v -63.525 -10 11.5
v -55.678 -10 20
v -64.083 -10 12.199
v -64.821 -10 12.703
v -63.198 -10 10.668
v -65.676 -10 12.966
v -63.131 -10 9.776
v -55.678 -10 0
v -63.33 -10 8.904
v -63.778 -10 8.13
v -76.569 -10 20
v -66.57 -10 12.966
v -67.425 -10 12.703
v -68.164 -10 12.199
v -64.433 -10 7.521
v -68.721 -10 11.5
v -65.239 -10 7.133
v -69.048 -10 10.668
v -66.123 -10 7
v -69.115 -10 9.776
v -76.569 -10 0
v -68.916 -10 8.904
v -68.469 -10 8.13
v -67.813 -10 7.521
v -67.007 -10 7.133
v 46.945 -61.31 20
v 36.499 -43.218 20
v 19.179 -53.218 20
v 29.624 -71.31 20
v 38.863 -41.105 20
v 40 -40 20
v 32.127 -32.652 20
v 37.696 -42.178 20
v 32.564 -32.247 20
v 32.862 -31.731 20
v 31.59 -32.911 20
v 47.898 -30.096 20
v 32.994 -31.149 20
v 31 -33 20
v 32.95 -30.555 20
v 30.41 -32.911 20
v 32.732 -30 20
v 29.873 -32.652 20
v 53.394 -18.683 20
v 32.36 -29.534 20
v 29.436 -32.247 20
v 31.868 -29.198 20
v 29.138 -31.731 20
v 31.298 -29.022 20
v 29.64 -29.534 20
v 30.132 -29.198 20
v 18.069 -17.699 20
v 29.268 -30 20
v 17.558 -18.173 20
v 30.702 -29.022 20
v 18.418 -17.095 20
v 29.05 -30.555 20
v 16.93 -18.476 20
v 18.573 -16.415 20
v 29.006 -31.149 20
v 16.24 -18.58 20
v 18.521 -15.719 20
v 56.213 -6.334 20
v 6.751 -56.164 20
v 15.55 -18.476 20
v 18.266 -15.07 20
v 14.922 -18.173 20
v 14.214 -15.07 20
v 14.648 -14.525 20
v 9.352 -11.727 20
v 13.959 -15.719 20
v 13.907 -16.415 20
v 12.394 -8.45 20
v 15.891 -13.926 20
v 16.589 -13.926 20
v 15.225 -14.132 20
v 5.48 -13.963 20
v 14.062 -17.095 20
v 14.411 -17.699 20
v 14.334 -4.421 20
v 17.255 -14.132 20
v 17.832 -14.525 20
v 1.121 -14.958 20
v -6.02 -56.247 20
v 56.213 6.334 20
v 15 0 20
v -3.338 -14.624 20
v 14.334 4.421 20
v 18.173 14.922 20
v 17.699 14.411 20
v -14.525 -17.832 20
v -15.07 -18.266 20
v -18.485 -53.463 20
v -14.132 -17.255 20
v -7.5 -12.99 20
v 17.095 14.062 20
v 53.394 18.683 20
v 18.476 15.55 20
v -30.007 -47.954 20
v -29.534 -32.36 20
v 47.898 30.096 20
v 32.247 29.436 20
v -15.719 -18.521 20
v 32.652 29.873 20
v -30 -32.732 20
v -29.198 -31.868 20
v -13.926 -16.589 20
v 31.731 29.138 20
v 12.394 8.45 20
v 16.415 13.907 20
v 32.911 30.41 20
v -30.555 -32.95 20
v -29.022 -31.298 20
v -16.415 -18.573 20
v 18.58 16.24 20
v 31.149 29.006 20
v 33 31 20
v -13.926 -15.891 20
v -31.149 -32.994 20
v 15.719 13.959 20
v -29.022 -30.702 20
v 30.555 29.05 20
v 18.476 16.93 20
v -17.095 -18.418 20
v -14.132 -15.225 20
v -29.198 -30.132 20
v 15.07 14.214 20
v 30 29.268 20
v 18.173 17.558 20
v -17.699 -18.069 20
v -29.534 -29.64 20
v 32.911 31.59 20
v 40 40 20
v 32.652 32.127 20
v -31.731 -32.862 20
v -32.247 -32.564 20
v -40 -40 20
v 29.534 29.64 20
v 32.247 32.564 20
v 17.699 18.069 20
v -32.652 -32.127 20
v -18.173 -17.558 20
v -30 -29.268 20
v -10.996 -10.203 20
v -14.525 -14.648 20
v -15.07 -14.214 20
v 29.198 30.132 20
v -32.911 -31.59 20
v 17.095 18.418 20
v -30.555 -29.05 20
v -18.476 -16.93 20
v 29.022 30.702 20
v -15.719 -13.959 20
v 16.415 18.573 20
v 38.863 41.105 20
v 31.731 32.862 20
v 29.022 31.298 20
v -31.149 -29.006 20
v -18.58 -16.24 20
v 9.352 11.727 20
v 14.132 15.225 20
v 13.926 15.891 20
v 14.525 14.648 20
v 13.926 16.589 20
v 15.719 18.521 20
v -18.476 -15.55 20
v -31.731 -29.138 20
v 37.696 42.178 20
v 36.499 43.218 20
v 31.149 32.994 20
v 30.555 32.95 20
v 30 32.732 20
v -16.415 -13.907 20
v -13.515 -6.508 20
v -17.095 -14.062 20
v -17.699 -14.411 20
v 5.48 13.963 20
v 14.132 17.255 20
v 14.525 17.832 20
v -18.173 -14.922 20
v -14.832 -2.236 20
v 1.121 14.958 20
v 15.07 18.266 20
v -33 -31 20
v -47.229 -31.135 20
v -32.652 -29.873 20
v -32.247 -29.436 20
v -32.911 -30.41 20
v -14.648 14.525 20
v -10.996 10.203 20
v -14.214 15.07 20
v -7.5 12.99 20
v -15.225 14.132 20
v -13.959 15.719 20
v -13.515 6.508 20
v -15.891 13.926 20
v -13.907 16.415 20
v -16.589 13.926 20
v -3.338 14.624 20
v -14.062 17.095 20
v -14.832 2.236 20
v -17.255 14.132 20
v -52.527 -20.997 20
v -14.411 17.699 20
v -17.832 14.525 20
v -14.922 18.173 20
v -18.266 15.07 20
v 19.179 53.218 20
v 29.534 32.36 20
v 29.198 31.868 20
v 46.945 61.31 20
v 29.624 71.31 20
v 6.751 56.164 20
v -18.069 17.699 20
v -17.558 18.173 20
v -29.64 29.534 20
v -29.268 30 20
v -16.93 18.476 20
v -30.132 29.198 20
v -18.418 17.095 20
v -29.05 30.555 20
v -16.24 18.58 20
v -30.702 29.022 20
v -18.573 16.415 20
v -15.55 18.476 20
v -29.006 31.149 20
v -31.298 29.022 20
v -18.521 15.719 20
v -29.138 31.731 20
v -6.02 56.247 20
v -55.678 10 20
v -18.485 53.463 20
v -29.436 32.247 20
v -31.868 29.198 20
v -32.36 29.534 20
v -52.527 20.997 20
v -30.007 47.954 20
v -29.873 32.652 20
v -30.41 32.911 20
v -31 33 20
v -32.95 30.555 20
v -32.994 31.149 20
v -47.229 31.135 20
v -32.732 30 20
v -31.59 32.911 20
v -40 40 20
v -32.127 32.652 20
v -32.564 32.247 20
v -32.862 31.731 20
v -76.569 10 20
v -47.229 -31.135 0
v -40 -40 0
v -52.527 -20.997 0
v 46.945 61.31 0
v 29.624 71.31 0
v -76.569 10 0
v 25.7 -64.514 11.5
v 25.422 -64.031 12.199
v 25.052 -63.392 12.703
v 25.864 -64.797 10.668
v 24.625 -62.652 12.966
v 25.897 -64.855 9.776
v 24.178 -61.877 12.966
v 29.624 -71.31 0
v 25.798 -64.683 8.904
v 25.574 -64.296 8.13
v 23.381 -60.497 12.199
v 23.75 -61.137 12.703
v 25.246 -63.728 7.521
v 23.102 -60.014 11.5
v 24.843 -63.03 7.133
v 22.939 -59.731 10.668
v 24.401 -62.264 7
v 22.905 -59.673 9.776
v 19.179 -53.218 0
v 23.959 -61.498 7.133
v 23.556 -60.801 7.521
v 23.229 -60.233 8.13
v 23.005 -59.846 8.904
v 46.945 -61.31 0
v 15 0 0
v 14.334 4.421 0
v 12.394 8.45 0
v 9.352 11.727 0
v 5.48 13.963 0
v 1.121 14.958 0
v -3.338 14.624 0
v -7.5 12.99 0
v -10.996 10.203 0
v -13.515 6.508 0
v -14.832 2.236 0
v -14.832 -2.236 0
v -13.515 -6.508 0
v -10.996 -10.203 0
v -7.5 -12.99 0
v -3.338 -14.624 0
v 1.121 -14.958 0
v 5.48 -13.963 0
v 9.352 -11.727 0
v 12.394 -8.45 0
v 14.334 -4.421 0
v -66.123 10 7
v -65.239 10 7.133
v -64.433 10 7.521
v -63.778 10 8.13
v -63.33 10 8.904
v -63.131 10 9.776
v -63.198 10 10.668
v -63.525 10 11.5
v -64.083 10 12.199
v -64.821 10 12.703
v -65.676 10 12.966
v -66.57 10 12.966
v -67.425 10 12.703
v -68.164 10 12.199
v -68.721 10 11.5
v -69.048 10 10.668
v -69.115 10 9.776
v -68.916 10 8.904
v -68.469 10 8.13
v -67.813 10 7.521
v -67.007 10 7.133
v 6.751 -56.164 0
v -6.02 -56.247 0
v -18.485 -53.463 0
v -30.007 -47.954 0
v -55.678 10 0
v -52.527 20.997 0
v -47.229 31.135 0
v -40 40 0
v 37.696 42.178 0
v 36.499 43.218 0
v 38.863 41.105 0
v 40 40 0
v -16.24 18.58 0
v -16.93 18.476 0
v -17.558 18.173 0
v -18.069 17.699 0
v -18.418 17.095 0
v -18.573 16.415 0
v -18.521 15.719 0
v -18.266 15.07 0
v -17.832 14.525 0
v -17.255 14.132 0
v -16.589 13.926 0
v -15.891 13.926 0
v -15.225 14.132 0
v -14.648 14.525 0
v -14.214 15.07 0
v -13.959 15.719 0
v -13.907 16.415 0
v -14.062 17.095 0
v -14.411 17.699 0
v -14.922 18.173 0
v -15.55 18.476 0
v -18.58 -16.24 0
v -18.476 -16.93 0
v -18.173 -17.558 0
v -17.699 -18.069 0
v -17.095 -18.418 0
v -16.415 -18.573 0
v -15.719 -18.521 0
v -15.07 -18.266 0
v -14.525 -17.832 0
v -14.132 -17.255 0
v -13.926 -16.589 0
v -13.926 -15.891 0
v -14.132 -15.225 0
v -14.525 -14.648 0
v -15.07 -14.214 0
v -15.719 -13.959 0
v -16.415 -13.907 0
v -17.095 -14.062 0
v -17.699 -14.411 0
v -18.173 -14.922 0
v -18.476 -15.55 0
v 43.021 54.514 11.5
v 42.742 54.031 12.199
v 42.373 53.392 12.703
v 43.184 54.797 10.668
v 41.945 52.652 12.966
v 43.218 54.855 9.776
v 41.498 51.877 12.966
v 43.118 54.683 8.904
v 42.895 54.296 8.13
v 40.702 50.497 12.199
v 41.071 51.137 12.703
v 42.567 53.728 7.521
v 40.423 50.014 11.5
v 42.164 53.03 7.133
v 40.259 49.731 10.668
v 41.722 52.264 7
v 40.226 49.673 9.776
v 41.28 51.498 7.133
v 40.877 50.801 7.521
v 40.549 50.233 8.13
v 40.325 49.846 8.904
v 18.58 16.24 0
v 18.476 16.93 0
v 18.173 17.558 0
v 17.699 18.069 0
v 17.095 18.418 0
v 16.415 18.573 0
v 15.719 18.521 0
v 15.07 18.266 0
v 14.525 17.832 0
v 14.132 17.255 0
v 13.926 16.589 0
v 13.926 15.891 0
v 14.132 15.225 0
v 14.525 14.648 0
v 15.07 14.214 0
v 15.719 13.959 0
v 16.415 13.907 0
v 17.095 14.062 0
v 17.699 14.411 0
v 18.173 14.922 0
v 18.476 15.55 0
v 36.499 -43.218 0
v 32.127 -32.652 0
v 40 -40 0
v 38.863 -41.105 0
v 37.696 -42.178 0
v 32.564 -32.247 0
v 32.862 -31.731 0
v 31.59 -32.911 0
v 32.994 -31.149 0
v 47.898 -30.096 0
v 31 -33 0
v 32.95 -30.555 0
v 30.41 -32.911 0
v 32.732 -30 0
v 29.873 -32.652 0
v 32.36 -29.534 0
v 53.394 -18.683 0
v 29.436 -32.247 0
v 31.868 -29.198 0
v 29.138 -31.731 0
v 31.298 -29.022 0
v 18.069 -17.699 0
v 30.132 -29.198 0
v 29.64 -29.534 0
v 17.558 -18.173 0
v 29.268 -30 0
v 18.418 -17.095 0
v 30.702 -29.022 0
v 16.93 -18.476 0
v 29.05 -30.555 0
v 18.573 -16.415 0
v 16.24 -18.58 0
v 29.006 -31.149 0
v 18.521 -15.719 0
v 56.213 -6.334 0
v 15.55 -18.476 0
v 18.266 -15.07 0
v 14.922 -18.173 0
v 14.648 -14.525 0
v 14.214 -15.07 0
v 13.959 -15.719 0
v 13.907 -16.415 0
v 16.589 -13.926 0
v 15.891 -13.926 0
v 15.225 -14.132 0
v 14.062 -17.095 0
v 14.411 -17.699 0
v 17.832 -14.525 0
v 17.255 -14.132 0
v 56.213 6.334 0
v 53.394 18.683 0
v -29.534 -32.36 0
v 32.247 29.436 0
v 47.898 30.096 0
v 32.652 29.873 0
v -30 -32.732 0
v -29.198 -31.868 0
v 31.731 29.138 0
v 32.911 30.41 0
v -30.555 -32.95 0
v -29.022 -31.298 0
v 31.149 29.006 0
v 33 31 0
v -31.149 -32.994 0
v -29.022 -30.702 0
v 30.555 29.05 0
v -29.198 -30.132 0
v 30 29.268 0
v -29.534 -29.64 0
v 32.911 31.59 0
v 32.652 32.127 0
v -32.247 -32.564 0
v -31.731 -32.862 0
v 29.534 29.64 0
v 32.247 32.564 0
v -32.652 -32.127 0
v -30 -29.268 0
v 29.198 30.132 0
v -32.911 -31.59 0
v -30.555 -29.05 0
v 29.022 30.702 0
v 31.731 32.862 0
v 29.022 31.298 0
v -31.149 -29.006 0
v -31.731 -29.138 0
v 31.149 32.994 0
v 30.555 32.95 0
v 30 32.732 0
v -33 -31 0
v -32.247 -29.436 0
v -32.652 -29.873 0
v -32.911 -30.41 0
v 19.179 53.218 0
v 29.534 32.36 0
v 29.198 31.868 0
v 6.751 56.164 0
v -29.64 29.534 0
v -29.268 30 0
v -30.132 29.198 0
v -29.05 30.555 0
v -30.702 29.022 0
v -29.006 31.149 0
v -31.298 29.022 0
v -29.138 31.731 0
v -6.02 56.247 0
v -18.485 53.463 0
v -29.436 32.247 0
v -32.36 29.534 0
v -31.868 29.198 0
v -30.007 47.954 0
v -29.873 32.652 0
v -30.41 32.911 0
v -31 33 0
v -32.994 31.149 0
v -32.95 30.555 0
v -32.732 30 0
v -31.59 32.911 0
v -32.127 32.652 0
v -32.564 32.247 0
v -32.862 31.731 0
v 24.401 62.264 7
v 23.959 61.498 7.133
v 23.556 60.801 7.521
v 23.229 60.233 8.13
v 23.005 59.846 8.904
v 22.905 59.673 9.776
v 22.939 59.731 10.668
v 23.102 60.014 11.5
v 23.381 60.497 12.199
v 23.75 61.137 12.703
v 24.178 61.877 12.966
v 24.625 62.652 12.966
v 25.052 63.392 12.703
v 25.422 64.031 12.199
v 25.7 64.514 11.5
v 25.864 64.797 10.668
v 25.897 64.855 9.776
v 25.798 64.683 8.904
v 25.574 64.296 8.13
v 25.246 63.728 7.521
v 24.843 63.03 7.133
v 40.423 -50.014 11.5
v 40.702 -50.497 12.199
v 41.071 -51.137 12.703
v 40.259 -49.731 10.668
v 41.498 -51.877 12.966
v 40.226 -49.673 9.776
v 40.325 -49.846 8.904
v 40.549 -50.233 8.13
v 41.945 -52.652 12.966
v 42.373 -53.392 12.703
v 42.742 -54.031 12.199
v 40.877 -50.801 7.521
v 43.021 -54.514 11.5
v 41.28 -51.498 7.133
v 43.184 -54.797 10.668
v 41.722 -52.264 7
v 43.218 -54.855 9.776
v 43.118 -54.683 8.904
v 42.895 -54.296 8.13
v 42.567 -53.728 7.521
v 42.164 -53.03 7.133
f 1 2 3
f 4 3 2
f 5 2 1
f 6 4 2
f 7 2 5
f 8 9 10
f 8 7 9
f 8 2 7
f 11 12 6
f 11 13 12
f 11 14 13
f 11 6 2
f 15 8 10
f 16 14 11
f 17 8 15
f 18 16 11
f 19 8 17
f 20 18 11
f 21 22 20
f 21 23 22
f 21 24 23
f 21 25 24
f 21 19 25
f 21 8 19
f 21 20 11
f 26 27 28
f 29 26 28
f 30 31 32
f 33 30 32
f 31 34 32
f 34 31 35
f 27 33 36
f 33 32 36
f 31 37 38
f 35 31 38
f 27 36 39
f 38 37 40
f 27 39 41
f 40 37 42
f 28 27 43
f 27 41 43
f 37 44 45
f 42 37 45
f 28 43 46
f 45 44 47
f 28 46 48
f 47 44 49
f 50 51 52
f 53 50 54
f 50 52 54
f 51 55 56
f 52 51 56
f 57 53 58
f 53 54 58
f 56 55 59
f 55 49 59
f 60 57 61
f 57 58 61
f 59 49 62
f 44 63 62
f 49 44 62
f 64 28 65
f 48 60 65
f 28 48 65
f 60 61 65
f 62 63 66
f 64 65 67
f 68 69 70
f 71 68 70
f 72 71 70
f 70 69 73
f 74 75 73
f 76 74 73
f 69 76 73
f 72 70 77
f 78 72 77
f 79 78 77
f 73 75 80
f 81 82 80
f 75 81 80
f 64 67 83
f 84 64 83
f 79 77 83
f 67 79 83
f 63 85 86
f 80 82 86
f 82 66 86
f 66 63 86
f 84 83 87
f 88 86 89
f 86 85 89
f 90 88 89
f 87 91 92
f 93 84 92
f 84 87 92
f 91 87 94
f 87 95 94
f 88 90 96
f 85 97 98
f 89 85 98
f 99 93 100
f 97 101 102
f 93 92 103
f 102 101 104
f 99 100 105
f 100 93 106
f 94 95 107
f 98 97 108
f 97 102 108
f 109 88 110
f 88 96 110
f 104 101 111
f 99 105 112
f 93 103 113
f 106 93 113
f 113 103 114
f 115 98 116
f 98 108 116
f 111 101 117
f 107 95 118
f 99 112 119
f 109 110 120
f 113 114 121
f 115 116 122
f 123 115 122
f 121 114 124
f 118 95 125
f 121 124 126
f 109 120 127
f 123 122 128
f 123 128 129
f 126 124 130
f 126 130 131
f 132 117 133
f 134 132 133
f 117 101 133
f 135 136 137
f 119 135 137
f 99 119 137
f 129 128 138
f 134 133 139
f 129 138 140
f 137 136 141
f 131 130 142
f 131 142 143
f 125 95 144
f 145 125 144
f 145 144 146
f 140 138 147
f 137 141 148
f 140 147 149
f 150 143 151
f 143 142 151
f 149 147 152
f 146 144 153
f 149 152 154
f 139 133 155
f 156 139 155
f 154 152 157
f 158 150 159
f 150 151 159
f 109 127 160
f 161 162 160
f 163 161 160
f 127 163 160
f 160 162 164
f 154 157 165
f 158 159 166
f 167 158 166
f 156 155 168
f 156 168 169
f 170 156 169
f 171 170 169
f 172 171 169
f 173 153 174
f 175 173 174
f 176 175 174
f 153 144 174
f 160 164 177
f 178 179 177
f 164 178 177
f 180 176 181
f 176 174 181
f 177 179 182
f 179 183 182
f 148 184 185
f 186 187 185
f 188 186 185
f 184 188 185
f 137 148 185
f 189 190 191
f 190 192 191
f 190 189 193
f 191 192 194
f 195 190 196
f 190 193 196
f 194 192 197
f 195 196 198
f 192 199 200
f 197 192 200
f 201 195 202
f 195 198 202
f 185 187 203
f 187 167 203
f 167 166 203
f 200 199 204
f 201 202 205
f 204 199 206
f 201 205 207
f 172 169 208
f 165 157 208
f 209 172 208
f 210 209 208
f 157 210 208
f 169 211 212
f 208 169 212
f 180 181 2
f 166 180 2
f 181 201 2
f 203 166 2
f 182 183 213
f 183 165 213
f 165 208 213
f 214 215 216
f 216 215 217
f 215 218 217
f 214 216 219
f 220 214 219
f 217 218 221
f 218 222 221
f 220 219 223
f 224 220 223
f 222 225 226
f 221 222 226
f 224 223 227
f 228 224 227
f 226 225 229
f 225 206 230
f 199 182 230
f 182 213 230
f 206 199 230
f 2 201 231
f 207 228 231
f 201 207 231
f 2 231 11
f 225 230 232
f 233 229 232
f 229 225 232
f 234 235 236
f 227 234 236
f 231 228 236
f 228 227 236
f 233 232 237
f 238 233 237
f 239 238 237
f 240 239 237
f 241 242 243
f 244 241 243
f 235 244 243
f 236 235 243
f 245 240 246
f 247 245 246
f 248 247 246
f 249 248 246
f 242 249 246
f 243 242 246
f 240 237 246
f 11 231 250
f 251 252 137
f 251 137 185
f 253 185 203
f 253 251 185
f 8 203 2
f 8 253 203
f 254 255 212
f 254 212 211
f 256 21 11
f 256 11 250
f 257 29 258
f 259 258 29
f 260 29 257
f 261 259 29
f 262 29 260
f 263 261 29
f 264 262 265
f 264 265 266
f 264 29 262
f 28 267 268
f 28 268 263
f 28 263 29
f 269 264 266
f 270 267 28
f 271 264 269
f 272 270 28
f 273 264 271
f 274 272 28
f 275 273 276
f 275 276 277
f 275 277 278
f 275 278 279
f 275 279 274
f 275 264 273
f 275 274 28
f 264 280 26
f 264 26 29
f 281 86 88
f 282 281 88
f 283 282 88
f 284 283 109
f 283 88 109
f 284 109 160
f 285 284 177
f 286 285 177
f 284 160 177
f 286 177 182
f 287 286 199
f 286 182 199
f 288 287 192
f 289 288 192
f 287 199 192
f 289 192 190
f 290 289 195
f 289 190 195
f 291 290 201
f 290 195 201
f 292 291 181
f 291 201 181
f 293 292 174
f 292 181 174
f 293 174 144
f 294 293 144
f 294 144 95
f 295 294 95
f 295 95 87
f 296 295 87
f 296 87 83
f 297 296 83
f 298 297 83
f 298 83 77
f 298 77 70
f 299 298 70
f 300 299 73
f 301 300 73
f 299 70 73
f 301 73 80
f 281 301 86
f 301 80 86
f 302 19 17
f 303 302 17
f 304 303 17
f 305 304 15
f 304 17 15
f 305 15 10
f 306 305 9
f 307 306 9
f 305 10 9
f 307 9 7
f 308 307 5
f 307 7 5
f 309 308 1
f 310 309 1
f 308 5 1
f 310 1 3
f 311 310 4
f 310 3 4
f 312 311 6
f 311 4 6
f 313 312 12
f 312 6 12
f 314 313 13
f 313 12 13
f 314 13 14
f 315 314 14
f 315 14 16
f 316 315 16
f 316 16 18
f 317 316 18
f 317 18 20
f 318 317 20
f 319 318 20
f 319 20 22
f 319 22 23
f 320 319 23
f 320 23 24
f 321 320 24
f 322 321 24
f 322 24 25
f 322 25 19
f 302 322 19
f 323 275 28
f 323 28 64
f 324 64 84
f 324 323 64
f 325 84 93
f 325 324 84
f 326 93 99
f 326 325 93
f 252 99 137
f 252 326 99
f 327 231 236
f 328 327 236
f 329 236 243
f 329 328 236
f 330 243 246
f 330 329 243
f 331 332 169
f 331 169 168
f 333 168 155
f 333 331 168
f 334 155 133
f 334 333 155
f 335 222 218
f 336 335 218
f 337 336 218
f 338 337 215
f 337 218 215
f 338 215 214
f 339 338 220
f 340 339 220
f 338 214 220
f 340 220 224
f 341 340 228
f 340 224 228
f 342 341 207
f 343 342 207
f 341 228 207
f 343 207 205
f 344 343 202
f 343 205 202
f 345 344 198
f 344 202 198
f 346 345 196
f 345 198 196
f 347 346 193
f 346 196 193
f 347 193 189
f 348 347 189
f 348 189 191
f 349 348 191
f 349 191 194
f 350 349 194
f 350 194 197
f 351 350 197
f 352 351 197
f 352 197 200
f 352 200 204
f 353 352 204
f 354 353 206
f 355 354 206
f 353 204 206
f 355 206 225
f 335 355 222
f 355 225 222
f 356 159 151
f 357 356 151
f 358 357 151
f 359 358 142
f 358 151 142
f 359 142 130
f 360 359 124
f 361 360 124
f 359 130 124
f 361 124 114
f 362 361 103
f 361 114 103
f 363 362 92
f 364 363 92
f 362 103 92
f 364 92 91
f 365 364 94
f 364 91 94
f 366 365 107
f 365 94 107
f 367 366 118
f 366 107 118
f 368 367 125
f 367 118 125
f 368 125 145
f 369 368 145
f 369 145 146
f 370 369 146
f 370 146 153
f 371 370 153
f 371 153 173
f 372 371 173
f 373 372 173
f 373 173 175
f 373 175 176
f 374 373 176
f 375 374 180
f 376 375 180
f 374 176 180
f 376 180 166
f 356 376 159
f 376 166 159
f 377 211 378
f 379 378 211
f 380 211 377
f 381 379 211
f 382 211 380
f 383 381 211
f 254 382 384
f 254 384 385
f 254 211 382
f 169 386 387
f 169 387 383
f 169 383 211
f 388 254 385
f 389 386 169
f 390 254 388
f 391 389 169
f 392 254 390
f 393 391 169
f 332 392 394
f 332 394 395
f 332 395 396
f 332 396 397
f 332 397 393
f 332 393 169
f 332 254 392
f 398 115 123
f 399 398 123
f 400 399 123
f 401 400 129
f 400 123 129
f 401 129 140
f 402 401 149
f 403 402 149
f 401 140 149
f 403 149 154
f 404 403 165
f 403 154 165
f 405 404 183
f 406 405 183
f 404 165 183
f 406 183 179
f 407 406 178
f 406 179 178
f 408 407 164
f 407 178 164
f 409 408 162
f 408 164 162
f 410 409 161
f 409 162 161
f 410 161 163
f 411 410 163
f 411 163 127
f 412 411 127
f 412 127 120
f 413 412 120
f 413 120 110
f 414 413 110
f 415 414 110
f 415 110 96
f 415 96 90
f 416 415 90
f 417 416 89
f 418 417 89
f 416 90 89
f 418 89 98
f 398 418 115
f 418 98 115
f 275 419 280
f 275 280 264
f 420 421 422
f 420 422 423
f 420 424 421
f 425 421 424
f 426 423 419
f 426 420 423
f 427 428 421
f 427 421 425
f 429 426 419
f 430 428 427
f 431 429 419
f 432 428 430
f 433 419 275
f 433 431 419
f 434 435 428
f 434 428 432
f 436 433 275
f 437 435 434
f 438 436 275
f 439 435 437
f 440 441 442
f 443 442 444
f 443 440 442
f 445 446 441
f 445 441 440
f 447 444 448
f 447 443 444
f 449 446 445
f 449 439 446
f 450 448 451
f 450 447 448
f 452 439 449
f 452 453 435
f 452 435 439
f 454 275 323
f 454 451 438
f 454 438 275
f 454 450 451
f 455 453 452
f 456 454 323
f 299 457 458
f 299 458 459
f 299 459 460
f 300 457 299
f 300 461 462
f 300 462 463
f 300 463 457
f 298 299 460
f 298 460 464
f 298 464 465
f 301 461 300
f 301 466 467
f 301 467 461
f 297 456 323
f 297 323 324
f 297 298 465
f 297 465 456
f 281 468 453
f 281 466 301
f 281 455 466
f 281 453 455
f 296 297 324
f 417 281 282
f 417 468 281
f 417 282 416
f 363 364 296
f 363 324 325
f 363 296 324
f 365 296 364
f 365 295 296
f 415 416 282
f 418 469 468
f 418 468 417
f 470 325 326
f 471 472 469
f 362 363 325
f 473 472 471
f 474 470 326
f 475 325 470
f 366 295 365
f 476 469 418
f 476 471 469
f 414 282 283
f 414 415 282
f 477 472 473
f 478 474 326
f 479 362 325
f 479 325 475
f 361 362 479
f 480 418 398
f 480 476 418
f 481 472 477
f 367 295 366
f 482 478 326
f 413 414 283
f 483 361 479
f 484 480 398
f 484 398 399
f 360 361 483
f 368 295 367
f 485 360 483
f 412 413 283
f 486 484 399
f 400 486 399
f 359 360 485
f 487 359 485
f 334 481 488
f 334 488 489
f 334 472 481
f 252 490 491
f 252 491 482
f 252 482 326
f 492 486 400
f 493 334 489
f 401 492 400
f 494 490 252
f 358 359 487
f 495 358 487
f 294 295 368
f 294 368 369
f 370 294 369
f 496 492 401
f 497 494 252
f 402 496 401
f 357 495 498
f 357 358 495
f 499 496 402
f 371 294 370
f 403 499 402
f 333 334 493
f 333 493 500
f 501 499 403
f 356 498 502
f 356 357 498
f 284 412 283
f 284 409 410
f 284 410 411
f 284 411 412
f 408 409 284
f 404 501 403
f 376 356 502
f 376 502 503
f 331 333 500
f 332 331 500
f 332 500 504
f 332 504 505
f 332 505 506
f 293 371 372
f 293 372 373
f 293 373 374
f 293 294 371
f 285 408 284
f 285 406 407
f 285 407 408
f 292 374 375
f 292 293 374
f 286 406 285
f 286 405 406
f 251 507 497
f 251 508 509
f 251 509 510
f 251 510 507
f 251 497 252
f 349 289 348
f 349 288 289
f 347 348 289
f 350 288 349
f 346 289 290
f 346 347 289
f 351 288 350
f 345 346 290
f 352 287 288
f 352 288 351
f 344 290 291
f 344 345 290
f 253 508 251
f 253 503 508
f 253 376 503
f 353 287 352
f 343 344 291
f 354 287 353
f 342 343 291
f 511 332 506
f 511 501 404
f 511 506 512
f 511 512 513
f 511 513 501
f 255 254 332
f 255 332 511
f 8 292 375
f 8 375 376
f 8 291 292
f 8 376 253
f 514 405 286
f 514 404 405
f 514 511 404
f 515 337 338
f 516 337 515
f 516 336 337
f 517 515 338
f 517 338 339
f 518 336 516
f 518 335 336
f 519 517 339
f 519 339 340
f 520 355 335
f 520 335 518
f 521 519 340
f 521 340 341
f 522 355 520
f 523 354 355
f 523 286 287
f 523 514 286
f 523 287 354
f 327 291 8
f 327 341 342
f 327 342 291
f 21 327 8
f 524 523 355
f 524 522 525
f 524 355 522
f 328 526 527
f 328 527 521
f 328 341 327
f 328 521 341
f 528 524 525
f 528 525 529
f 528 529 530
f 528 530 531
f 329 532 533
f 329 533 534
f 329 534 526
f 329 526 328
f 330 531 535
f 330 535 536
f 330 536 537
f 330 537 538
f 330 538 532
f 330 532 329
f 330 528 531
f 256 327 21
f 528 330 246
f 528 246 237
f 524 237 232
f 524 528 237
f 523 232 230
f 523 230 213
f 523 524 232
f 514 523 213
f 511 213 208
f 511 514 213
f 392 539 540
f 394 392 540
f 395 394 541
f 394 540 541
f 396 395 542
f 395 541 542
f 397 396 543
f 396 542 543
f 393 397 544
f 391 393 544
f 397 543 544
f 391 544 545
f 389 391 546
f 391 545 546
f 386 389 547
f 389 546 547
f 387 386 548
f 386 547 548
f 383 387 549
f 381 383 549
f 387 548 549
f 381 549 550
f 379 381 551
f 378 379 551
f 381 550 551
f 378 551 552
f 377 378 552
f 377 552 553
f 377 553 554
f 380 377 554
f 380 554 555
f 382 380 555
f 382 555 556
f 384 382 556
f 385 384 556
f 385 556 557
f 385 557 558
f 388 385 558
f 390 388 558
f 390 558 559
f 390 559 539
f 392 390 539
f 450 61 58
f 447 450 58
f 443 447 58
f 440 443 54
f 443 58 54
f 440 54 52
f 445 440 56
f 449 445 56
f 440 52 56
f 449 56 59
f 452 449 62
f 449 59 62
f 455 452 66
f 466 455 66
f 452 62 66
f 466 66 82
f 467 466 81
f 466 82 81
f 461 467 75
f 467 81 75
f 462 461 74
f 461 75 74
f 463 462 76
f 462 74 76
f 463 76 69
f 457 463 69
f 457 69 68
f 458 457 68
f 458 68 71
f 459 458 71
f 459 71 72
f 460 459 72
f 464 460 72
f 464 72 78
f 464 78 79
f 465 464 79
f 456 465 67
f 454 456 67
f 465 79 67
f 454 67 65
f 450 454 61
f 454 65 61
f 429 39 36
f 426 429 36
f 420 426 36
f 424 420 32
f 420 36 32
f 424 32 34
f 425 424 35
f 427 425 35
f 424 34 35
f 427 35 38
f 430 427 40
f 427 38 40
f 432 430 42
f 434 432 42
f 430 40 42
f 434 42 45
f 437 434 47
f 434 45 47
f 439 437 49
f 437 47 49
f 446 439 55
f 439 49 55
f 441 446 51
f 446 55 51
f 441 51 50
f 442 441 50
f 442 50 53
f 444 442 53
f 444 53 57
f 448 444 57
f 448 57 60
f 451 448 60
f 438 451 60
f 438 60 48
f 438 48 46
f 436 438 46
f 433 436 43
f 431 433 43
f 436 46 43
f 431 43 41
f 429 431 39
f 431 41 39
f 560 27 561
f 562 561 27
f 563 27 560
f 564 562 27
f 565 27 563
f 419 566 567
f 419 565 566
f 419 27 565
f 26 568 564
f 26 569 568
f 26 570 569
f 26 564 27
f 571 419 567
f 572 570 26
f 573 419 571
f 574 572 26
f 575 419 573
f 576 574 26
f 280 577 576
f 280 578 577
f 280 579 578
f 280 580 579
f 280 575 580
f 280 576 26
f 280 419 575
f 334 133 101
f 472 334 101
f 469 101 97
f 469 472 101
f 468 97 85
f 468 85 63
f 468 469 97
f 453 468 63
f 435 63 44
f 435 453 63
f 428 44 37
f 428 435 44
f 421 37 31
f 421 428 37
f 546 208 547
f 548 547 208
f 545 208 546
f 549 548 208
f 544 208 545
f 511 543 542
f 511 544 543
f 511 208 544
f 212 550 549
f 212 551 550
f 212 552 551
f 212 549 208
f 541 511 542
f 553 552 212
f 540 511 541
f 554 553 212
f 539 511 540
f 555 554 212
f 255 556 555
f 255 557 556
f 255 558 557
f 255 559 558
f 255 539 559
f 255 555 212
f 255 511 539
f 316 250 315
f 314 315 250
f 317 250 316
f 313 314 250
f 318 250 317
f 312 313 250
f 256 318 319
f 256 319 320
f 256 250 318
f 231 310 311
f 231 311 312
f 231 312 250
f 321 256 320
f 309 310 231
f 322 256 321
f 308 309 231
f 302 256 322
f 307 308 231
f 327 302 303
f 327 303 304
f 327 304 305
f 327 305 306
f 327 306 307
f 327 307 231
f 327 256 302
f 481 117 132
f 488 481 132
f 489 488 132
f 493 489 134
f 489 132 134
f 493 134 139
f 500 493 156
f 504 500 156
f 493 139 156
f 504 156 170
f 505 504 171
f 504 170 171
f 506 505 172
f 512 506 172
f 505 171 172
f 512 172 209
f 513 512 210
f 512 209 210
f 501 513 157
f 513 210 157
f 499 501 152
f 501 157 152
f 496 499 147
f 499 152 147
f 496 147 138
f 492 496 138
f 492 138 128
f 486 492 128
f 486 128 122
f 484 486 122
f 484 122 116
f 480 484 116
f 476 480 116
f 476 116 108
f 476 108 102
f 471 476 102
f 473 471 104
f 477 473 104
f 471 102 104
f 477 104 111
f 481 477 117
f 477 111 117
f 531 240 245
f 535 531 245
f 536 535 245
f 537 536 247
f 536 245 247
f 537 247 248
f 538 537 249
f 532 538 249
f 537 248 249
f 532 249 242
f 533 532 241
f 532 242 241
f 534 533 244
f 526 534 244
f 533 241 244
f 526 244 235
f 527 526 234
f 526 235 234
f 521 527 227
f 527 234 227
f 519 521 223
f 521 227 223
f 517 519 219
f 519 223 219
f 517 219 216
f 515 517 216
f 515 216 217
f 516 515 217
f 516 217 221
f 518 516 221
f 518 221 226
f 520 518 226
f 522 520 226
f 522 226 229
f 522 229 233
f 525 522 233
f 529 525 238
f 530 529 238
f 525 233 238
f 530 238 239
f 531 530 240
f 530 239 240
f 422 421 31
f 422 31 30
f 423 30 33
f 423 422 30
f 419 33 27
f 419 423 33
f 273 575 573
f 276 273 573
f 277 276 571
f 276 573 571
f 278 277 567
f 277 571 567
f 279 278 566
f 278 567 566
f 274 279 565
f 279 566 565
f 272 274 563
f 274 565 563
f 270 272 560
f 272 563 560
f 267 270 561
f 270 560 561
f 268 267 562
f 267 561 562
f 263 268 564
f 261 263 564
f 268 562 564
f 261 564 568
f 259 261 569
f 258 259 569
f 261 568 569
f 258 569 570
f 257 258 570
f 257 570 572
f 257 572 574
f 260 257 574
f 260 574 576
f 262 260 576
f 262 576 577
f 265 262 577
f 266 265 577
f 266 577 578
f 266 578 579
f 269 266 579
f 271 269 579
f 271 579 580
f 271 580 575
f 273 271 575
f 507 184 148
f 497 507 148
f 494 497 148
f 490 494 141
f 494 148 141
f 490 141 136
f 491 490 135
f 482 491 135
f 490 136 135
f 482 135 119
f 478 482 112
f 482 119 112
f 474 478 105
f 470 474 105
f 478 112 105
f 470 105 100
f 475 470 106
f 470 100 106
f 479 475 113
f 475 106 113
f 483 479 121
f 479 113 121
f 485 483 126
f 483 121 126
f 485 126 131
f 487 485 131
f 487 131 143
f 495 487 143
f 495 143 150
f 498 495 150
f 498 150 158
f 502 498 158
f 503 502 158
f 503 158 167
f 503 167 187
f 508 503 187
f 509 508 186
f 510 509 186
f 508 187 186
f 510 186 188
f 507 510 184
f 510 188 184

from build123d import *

# Parameters (mm, degrees)
SKETCH_1_W               = 80
SKETCH_1_H               = 80
EXTRUDE_1_DEPTH          = 20
SKETCH_2_R               = 15
CUT_EXTRUDE_1_DEPTH      = 20
SKETCH_3_R               = 2
CUT_EXTRUDE_2_DEPTH      = 20
PATTERN_CIRCULAR_1_COUNT = 4
SKETCH_4_R               = 2.34
CUT_EXTRUDE_3_DEPTH      = 20
PATTERN_CIRCULAR_2_COUNT = 4
EXTRUDE_3_DEPTH          = 20
EXTRUDE_4_DEPTH          = 20
SKETCH_7_R               = 3
CUT_EXTRUDE_4_DEPTH      = 104.412342347
PATTERN_CIRCULAR_3_COUNT = 3


with BuildPart() as part:
    # 草图1 → 凸台-拉伸1 (new body)
    with BuildSketch(Plane.XY):
        Rectangle(SKETCH_1_W, SKETCH_1_H)
    extrude(amount=EXTRUDE_1_DEPTH)

    # 草图2 → 切除-拉伸1 (cut)
    with BuildSketch(Plane.XY.offset(20)):
        Circle(SKETCH_2_R)
    extrude(amount=-CUT_EXTRUDE_1_DEPTH, mode=Mode.SUBTRACT)

    # 草图3 → 切除-拉伸2 (cut)
    with BuildSketch(Plane.XY.offset(20)):
        with Locations((31, 31)):
            Circle(SKETCH_3_R)
    cut_extrude_2 = extrude(amount=-CUT_EXTRUDE_2_DEPTH, mode=Mode.SUBTRACT)

    # 阵列(圆周)1: 切除-拉伸2 ×4 about axis
    pattern_circular_1_axis = Axis((0, 0, 0), (0, 0, 1))
    for i in range(1, PATTERN_CIRCULAR_1_COUNT):
        add(cut_extrude_2.rotate(pattern_circular_1_axis, i * 360 / PATTERN_CIRCULAR_1_COUNT), mode=Mode.SUBTRACT)

    # 草图4 → 切除-拉伸3 (cut)
    with BuildSketch(Plane.XY.offset(20)):
        with Locations((16.24, 16.24)):
            Circle(SKETCH_4_R)
    cut_extrude_3 = extrude(amount=-CUT_EXTRUDE_3_DEPTH, mode=Mode.SUBTRACT)

    # 阵列(圆周)2: 切除-拉伸3 ×4 about axis
    pattern_circular_2_axis = Axis((0, 0, 0), (0, 0, 1))
    for i in range(1, PATTERN_CIRCULAR_2_COUNT):
        add(cut_extrude_3.rotate(pattern_circular_2_axis, i * 360 / PATTERN_CIRCULAR_2_COUNT), mode=Mode.SUBTRACT)

    # 草图5 → 凸台-拉伸3 (add)
    with BuildSketch(Plane(origin=(0, 0, 0), x_dir=(-1, 0, 0), z_dir=(0, 0, -1))):
        with BuildLine():
            Line((40, 40), (40, -40))
            ThreePointArc((40, -40), (52.262518595, -21.647844006), (56.568542495, 0))
            ThreePointArc((56.568542495, 0), (52.262518595, 21.647844006), (40, 40))
        make_face()
        with BuildLine():
            ThreePointArc((-40, -40), (0, -56.568542495), (40, -40))
            Line((40, -40), (-40, -40))
        make_face()
        with BuildLine():
            ThreePointArc((-40, 40), (-56.568542495, 0), (-40, -40))
            Line((-40, -40), (-40, 40))
        make_face()
        with BuildLine():
            Line((-40, 40), (40, 40))
            ThreePointArc((40, 40), (0, 56.568542495), (-40, 40))
        make_face()
    extrude(amount=-EXTRUDE_3_DEPTH)

    # 草图6 → 凸台-拉伸4 (add)
    with BuildSketch(Plane(origin=(0, 0, 0), x_dir=(-1, 0, 0), z_dir=(0, 0, -1))):
        with BuildLine():
            Line((76.568542495, 10), (55.677643628, 10))
            ThreePointArc((55.677643628, 10), (56.345377582, 5.019803303), (56.568542495, 0))
            ThreePointArc((56.568542495, 0), (56.345377582, -5.019803303), (55.677643628, -10))
            Line((55.677643628, -10), (76.568542495, -10))
            Line((76.568542495, -10), (76.568542495, 0))
            Line((76.568542495, 0), (76.568542495, 10))
        make_face()
    extrude_4 = extrude(amount=-EXTRUDE_4_DEPTH)

    # 草图7 → 切除-拉伸4 (cut, through all)
    with BuildSketch(Plane(origin=(0, -10, 0), x_dir=(-1, 0, 0), z_dir=(0, -1, 0))):
        with Locations(Location((66.123093062, -10, 0), (0, 0, 90))):
            Circle(SKETCH_7_R)
    cut_extrude_4 = extrude(amount=-CUT_EXTRUDE_4_DEPTH, mode=Mode.SUBTRACT)

    # 阵列(圆周)3: 凸台-拉伸4, 切除-拉伸4 ×3 about axis
    pattern_circular_3_axis = Axis((0, 0, 0), (0, 0, 1))
    add([extrude_4.rotate(pattern_circular_3_axis, i * 360 / PATTERN_CIRCULAR_3_COUNT) for i in range(1, PATTERN_CIRCULAR_3_COUNT)])
    add([cut_extrude_4.rotate(pattern_circular_3_axis, i * 360 / PATTERN_CIRCULAR_3_COUNT) for i in range(1, PATTERN_CIRCULAR_3_COUNT)], mode=Mode.SUBTRACT)


solid = part.part
